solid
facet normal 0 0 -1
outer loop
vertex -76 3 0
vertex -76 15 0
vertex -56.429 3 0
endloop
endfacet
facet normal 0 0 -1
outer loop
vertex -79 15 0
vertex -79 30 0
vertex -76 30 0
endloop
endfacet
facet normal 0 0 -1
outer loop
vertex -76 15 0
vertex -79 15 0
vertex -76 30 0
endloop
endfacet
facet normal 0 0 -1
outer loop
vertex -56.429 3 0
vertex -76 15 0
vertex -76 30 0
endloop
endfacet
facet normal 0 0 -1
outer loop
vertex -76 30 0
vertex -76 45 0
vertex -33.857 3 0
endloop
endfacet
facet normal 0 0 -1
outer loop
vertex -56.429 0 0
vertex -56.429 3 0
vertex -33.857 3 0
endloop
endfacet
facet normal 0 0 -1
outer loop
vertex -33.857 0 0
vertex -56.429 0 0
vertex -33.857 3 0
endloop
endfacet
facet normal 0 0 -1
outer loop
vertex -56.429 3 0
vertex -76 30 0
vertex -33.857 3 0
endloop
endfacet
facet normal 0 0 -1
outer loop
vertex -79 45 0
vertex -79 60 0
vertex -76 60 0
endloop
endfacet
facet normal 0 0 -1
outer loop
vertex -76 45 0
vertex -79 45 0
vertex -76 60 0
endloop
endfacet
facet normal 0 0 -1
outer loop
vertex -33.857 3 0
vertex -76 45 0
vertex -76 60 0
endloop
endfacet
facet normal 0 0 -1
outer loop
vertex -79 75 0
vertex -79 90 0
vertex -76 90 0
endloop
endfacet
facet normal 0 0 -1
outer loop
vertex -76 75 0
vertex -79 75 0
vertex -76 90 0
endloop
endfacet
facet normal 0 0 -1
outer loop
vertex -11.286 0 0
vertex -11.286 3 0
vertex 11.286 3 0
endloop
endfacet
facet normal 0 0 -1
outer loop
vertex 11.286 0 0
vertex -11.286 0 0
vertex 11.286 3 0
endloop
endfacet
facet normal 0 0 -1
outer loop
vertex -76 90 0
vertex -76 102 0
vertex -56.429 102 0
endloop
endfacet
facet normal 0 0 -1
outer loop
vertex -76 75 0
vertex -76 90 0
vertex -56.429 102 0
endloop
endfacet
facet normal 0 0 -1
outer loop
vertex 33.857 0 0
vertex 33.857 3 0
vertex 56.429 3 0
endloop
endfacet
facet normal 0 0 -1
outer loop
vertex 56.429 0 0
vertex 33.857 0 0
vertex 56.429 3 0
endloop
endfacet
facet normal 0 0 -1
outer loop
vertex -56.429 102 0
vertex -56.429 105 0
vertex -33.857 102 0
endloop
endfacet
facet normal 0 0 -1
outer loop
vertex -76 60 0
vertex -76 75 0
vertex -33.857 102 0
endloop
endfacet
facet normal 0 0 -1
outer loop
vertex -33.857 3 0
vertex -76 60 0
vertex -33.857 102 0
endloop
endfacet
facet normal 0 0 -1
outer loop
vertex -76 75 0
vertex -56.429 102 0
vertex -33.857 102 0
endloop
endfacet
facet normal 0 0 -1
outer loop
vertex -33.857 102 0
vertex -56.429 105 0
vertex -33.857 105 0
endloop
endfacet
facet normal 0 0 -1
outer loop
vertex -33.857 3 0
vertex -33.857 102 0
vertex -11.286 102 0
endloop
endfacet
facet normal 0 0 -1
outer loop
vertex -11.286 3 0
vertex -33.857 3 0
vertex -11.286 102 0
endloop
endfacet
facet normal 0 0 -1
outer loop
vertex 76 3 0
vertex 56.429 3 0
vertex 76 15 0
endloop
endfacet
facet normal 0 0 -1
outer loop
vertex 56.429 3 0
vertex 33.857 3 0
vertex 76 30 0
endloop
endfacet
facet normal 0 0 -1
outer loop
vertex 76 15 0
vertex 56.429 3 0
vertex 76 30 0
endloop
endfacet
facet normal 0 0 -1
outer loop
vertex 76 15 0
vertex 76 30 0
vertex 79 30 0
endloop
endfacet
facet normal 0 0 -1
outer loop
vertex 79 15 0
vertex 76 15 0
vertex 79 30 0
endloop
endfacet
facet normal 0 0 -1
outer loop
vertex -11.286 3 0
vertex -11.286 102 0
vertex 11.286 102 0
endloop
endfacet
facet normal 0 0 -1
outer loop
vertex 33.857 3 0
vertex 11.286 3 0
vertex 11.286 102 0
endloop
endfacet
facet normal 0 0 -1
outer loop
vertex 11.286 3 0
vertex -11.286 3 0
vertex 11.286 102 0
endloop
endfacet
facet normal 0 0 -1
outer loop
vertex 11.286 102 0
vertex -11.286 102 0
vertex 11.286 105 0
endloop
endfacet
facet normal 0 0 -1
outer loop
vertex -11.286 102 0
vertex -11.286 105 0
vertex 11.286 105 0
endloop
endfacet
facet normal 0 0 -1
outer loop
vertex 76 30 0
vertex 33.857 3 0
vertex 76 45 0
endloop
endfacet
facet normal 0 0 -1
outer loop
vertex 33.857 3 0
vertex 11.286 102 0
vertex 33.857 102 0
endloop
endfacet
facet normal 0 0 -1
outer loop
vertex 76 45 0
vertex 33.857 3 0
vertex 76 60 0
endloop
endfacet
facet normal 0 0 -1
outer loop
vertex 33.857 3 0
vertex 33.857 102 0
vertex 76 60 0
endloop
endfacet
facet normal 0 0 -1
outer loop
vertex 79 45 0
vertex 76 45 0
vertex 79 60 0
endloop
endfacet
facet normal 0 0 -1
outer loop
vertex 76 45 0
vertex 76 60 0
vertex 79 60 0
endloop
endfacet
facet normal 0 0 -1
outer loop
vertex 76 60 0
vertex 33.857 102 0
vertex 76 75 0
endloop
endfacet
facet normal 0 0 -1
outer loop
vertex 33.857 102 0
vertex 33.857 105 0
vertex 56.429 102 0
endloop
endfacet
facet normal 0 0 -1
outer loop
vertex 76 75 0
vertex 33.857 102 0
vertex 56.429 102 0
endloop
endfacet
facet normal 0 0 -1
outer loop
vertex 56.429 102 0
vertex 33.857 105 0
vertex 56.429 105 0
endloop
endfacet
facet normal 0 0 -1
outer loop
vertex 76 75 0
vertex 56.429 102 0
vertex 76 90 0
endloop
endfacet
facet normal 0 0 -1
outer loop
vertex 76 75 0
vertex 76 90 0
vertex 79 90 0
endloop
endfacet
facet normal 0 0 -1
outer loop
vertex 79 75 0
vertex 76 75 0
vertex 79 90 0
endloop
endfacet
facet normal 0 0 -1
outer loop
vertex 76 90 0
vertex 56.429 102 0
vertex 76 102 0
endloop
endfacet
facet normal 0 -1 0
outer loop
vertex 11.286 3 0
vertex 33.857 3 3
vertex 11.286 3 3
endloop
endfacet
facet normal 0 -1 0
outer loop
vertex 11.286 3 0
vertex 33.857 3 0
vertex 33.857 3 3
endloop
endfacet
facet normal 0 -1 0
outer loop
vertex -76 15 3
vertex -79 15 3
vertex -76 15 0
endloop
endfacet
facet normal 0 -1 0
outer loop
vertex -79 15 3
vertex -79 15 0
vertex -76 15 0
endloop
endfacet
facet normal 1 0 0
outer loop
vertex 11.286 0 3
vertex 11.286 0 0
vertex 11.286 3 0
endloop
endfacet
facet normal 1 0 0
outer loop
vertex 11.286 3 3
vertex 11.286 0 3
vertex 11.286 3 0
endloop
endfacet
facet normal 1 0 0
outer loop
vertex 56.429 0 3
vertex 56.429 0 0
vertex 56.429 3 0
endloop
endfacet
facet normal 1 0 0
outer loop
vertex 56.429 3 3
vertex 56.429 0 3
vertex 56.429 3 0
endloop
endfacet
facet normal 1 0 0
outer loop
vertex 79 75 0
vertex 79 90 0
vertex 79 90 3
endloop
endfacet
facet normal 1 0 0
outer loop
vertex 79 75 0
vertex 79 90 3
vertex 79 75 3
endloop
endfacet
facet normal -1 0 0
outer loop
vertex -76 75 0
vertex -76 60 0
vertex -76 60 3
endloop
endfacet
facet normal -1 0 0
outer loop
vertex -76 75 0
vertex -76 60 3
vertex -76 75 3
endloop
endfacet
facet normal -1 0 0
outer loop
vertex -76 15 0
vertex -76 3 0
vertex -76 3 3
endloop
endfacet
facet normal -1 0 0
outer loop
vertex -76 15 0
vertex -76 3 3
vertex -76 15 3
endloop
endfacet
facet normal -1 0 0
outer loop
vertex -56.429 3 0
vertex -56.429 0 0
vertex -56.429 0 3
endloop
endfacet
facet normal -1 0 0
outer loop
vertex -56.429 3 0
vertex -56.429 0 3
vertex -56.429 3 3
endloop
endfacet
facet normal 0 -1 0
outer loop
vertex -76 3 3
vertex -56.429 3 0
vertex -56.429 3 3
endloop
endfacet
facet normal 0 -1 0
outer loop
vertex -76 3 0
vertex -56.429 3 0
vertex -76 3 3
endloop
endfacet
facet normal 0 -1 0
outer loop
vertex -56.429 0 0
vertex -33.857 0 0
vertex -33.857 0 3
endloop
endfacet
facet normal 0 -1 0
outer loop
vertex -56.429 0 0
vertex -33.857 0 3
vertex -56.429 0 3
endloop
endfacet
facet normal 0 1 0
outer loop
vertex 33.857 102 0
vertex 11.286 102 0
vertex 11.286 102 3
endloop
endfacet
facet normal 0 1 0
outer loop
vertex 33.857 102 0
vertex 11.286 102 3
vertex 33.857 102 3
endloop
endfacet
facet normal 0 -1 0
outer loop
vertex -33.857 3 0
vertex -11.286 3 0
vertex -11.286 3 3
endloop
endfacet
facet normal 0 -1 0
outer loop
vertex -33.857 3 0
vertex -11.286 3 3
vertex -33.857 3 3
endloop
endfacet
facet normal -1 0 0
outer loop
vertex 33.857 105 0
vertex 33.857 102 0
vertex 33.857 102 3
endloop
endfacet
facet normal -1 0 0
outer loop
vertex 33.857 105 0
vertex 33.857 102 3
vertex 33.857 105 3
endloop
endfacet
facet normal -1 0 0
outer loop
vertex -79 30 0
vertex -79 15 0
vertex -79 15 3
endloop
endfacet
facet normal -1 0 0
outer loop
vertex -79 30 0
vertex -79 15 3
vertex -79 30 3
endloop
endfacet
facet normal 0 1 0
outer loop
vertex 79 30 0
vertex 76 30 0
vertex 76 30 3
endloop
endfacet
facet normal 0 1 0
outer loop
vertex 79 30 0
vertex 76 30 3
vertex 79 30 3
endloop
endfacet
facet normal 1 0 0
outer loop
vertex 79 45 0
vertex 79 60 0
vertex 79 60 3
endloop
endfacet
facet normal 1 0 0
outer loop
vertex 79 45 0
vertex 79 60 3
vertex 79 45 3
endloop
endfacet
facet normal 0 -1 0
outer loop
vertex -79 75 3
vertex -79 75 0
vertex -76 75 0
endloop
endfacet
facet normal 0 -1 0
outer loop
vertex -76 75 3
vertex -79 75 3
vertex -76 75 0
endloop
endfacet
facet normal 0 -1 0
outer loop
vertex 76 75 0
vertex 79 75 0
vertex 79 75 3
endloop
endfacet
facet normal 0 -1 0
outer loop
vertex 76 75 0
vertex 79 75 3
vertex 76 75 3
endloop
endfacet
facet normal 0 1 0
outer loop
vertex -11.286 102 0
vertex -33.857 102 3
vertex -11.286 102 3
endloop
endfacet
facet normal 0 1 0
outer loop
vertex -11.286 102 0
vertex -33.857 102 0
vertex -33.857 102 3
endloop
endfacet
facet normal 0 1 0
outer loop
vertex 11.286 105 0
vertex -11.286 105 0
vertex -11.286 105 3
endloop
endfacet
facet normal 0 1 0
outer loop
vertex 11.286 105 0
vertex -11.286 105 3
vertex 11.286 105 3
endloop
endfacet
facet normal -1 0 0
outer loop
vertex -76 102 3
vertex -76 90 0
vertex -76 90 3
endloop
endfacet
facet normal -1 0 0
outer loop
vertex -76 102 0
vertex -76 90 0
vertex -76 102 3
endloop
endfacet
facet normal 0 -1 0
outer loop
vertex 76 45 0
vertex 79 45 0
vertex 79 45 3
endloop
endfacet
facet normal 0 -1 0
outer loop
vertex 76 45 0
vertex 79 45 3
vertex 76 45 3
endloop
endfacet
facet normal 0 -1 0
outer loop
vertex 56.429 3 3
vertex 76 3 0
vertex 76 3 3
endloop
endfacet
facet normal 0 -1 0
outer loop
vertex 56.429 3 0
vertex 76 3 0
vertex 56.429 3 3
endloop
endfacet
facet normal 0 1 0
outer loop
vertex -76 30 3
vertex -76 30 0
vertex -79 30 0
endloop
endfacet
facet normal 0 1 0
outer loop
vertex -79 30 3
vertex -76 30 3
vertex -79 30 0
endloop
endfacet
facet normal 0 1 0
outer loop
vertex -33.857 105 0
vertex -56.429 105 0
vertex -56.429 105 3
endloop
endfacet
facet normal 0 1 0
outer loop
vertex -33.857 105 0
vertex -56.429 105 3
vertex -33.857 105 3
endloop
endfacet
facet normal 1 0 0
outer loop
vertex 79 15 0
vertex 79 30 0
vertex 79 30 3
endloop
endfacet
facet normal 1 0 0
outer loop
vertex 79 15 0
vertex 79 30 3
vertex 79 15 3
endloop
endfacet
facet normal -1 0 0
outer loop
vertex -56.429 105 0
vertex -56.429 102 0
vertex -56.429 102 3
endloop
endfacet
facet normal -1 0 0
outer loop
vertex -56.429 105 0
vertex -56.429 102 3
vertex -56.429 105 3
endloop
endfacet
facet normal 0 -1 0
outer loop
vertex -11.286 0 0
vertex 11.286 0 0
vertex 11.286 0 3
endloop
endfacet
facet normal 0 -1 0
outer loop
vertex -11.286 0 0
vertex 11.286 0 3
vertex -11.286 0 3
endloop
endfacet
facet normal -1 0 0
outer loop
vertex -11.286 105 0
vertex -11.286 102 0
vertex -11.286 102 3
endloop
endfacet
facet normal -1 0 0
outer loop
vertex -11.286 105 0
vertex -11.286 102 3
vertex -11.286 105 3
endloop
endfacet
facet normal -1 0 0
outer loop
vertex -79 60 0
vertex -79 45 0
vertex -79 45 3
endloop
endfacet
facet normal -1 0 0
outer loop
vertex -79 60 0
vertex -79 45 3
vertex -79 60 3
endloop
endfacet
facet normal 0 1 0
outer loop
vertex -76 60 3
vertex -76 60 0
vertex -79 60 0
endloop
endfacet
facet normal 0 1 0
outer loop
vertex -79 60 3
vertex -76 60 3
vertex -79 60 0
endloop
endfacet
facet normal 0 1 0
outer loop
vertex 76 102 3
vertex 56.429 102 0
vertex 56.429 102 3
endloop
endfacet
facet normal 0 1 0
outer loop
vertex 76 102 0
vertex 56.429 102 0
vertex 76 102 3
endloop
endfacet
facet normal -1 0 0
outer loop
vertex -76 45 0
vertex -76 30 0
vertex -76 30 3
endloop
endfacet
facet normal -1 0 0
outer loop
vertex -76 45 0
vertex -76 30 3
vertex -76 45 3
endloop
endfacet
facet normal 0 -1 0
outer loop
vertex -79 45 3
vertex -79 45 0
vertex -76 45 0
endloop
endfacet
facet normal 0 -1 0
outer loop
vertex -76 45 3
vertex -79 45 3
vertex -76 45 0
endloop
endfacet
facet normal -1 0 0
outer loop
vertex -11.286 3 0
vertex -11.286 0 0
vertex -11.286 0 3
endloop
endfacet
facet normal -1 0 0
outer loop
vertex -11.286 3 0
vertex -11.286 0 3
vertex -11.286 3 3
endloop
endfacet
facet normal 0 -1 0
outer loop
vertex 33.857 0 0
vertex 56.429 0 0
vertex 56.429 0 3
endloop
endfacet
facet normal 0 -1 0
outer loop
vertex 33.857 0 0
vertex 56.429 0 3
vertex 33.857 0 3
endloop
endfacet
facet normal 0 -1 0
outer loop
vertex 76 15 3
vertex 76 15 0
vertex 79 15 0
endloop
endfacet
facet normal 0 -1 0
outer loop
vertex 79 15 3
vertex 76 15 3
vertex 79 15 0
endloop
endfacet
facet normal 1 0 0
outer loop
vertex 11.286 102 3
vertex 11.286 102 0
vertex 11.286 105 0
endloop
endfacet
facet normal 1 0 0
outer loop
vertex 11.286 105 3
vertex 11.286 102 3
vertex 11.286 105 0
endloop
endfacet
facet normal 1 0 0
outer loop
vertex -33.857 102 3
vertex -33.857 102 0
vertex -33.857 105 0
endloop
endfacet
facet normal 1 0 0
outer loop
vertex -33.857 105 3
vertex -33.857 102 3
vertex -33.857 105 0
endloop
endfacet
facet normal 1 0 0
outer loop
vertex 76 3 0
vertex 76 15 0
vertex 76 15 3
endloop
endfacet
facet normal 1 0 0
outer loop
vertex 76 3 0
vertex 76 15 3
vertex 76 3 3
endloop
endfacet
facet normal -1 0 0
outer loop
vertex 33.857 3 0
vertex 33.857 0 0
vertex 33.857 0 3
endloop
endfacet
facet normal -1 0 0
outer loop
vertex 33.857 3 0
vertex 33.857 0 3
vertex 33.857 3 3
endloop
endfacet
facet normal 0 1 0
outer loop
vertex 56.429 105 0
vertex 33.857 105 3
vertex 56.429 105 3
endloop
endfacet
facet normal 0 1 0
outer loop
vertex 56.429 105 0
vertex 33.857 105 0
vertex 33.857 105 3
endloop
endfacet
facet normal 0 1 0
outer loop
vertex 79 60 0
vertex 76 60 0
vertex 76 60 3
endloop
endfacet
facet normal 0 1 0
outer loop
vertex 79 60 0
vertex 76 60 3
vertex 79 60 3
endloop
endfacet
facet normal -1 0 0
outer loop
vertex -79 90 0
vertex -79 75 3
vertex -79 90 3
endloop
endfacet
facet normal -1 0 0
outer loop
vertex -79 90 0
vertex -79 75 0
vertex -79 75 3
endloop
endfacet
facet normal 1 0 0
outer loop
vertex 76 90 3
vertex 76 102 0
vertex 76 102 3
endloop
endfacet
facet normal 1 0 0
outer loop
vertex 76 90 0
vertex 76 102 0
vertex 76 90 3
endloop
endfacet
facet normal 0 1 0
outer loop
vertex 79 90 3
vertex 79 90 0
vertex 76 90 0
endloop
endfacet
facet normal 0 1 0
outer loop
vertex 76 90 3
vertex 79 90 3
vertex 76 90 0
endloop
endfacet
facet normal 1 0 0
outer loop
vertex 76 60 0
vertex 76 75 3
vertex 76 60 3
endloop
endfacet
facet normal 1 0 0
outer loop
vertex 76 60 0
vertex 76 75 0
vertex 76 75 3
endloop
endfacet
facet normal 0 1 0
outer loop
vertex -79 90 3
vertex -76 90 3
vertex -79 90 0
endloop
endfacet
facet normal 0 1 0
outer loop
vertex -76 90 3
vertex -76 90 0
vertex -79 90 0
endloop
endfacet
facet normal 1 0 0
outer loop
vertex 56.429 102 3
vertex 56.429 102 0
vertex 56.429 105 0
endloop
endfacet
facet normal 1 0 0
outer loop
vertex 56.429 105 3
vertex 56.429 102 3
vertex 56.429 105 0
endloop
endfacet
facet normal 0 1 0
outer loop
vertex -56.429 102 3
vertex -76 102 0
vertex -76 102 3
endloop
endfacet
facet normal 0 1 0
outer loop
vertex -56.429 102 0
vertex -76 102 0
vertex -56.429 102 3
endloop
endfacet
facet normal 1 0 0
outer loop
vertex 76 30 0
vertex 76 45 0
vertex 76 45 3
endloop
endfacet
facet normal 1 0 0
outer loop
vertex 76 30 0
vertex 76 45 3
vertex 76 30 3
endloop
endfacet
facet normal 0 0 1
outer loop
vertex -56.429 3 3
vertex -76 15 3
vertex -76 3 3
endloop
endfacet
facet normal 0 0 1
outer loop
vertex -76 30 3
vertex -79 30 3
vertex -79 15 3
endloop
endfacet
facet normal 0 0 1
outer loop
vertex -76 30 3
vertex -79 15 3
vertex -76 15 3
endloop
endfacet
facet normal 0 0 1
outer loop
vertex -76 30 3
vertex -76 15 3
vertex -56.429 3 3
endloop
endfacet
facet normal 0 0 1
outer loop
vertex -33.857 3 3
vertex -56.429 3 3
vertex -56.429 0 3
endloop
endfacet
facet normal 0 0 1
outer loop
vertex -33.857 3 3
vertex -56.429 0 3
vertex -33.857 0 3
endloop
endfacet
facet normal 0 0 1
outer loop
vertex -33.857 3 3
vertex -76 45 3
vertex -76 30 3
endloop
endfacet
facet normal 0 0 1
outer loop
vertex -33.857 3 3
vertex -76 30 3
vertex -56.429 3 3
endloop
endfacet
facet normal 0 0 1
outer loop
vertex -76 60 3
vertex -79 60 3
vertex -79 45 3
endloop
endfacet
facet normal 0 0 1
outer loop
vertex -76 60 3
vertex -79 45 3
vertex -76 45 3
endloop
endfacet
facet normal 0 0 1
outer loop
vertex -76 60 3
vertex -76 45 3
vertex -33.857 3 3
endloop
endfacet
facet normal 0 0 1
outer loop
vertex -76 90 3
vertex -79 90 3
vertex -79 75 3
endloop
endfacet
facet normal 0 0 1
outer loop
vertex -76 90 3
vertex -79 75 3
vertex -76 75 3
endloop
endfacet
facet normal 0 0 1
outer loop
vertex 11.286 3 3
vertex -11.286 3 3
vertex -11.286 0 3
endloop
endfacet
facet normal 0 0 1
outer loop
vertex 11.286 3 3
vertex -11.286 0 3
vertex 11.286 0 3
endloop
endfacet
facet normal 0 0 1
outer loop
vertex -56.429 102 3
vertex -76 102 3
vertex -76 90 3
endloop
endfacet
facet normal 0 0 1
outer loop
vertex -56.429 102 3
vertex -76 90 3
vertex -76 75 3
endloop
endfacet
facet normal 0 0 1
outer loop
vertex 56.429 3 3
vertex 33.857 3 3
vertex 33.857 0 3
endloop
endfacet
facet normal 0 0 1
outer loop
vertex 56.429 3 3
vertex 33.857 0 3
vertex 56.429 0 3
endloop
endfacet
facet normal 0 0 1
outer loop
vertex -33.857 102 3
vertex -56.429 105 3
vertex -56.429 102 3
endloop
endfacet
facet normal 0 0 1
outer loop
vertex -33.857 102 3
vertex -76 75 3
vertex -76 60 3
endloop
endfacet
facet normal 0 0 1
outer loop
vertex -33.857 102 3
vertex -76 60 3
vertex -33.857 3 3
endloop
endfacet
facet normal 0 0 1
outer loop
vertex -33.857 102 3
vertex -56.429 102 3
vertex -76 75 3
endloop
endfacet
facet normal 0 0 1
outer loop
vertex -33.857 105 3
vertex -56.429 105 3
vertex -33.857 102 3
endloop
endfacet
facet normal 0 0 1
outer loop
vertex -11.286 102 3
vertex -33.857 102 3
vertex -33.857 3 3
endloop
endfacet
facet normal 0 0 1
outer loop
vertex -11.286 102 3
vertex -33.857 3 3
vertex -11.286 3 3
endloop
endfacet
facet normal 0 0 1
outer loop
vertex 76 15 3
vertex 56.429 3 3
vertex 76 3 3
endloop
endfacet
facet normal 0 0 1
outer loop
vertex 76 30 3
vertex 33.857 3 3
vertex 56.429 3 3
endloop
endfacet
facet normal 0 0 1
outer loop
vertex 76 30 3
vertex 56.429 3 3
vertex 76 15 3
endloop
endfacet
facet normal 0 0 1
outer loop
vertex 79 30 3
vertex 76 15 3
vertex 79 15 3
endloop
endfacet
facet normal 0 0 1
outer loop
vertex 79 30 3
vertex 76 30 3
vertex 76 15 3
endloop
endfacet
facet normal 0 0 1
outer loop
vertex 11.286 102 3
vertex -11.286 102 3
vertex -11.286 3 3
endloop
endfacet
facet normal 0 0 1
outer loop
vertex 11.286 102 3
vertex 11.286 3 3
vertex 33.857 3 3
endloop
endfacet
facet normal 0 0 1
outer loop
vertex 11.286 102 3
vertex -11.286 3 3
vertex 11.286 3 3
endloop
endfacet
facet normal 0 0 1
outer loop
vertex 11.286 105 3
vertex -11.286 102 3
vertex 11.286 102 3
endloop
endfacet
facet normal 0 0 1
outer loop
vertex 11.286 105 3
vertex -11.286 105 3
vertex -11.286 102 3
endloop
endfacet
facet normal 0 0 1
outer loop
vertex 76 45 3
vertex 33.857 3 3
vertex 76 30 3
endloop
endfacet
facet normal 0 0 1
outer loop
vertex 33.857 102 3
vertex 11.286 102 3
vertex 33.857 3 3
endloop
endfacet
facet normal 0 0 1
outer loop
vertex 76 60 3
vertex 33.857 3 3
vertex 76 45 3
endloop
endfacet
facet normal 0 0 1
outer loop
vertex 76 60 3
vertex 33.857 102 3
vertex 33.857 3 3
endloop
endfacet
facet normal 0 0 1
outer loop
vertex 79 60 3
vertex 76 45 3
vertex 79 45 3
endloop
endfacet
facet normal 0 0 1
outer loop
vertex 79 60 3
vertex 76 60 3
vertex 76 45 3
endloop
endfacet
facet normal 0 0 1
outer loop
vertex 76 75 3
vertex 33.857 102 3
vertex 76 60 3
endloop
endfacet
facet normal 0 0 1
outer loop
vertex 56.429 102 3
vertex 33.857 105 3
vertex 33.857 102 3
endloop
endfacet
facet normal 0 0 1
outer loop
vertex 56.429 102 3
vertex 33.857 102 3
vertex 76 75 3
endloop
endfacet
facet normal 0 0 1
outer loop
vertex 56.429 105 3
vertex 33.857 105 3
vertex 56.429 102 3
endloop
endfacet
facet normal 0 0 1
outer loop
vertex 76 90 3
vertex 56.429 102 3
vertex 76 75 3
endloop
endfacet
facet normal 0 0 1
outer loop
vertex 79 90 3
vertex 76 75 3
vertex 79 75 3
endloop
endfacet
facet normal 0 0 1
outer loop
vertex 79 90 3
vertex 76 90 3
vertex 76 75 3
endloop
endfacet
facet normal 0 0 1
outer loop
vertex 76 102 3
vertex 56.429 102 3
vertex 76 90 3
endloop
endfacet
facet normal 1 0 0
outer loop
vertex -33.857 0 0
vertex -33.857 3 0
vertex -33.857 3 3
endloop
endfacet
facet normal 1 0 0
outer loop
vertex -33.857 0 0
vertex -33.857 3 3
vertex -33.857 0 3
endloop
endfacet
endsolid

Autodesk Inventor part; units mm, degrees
ref_plane "YZ Plane" through (0, 0, 0) normal (1, 0, 0) x (0, 1, 0)
ref_plane "XZ Plane" through (0, 0, 0) normal (0, 1, 0) x (-1, 0, 0)
ref_plane "XY Plane" through (0, 0, 0) normal (0, 0, 1) x (1, 0, 0)
sketch "Sketch1" plane through (0, 0, 0) normal (0, 0, 1) x (1, 0, 0)
  line L0 (-79, 15) -> (-76, 15)
  line L1 (-76, 30) -> (-79, 30)
  line L2 (-79, 45) -> (-76, 45)
  line L3 (-76, 60) -> (-79, 60)
  line L4 (-79, 75) -> (-76, 75)
  line L5 (-76, 90) -> (-79, 90)
  line L6 (76, 15) -> (79, 15)
  line L7 (76, 30) -> (79, 30)
  line L8 (79, 45) -> (76, 45)
  line L9 (76, 60) -> (79, 60)
  line L10 (79, 75) -> (76, 75)
  line L11 (79, 90) -> (76, 90)
  line L12 (-56.4286, 0) -> (-56.4286, 3)
  line L13 (-33.8571, 3) -> (-33.8571, 0)
  line L14 (-11.2857, 0) -> (-11.2857, 3)
  line L15 (11.2857, 0) -> (11.2857, 3)
  line L16 (33.8571, 0) -> (33.8571, 3)
  line L17 (56.4286, 0) -> (56.4286, 3)
  line L18 (-56.4286, 102) -> (-56.4286, 105)
  line L19 (-33.8571, 102) -> (-33.8571, 105)
  line L20 (-11.2857, 102) -> (-11.2857, 105)
  line L21 (11.2857, 102) -> (11.2857, 105)
  line L22 (33.8571, 102) -> (33.8571, 105)
  line L23 (56.4286, 102) -> (56.4286, 105)
  line L24 (-56.4286, 3) -> (-76, 3)
  line L25 (-76, 3) -> (-76, 15)
  line L26 (-76, 30) -> (-76, 45)
  line L27 (-76, 60) -> (-76, 75)
  line L28 (-76, 90) -> (-76, 102)
  line L29 (-76, 102) -> (-56.4286, 102)
  line L30 (-33.8571, 102) -> (-11.2857, 102)
  line L31 (11.2857, 102) -> (33.8571, 102)
  line L32 (56.4286, 102) -> (76, 102)
  line L33 (-11.2857, 3) -> (-33.8571, 3)
  line L34 (76, 3) -> (56.4286, 3)
  line L35 (33.8571, 3) -> (11.2857, 3)
  line L36 (-79, 75) -> (-79, 90)
  line L37 (-79, 15) -> (-79, 30)
  line L38 (-79, 45) -> (-79, 60)
  line L39 (-33.8571, 0) -> (-56.4286, 0)
  line L40 (56.4286, 0) -> (33.8571, 0)
  line L41 (11.2857, 0) -> (-11.2857, 0)
  line L42 (-56.4286, 105) -> (-33.8571, 105)
  line L43 (-11.2857, 105) -> (11.2857, 105)
  line L44 (33.8571, 105) -> (56.4286, 105)
  line L45 (79, 30) -> (79, 15)
  line L46 (79, 90) -> (79, 75)
  line L47 (79, 60) -> (79, 45)
  line L48 (76, 102) -> (76, 90)
  line L49 (76, 75) -> (76, 60)
  line L50 (76, 45) -> (76, 30)
  line L51 (76, 15) -> (76, 3)
  point P0 (0, 0)
  dimension "d1" = 158
  dimension "d5" = 22.5714
  dimension "d6" = 79
  dimension "d7" = 45.1429
  dimension "d8" = 67.7143
  dimension "d9" = 90.2857
  dimension "d10" = 112.8571
  dimension "d11" = 135.4286
  dimension "d12" = 105
  dimension "d13" = 15
  dimension "d14" = 0
  dimension "d15" = 3
  dimension "d16" = 30
  dimension "d17" = 45
  dimension "d18" = 60
  dimension "d19" = 75
  dimension "d20" = 90
  dimension "d21" = 99
  dimension "d22" = 3
  dimension "d23" = 3
extrude "Extrusion1" add sketch "Sketch1" along normal blind 3
equation "\"d1\" = shelfWs"
equation "\"d5\" = 0.142857 * shelfWs - tol"
equation "\"d6\" = 0.5 * shelfWs"
equation "\"d7\" = 0.285714 * shelfWs + tol"
equation "\"d8\" = 0.428571 * shelfWs - tol"
equation "\"d9\" = 0.571429 * shelfWs + tol"
equation "\"d10\" = 0.714286 * shelfWs - tol"
equation "\"d11\" = 0.857143 * shelfWs + tol"
equation "\"d12\" = shelfD"
equation "\"d13\" = 0.142857 * shelfD - tol"
equation "\"d15\" = tt"
equation "\"d16\" = 0.285714 * shelfD + tol"
equation "\"d17\" = 0.428571 * shelfD - tol"
equation "\"d18\" = 0.571429 * shelfD + tol"
equation "\"d19\" = 0.714286 * shelfD - tol"
equation "\"d20\" = 0.857143 * shelfD + tol"
equation "\"d21\" = -2 * tt + shelfD"
equation "\"d22\" = tt"
equation "\"d23\" = tt"
equation "\"d24\" = tt"
equation "\"d0\" = 0.5 * shelfWs"
equation "\"tt\" = 3"
equation "\"tol\" = 0"
equation "\"d2\" = shelfD"
equation "\"d4\" = tt"
equation "\"tiroir\" = 1"
equation "\"nHoles\" = 4"
equation "\"shelfH\" = 35"
equation "\"shelfWs\" = 158"
equation "\"shelfD\" = 105"
properties part number "back"
